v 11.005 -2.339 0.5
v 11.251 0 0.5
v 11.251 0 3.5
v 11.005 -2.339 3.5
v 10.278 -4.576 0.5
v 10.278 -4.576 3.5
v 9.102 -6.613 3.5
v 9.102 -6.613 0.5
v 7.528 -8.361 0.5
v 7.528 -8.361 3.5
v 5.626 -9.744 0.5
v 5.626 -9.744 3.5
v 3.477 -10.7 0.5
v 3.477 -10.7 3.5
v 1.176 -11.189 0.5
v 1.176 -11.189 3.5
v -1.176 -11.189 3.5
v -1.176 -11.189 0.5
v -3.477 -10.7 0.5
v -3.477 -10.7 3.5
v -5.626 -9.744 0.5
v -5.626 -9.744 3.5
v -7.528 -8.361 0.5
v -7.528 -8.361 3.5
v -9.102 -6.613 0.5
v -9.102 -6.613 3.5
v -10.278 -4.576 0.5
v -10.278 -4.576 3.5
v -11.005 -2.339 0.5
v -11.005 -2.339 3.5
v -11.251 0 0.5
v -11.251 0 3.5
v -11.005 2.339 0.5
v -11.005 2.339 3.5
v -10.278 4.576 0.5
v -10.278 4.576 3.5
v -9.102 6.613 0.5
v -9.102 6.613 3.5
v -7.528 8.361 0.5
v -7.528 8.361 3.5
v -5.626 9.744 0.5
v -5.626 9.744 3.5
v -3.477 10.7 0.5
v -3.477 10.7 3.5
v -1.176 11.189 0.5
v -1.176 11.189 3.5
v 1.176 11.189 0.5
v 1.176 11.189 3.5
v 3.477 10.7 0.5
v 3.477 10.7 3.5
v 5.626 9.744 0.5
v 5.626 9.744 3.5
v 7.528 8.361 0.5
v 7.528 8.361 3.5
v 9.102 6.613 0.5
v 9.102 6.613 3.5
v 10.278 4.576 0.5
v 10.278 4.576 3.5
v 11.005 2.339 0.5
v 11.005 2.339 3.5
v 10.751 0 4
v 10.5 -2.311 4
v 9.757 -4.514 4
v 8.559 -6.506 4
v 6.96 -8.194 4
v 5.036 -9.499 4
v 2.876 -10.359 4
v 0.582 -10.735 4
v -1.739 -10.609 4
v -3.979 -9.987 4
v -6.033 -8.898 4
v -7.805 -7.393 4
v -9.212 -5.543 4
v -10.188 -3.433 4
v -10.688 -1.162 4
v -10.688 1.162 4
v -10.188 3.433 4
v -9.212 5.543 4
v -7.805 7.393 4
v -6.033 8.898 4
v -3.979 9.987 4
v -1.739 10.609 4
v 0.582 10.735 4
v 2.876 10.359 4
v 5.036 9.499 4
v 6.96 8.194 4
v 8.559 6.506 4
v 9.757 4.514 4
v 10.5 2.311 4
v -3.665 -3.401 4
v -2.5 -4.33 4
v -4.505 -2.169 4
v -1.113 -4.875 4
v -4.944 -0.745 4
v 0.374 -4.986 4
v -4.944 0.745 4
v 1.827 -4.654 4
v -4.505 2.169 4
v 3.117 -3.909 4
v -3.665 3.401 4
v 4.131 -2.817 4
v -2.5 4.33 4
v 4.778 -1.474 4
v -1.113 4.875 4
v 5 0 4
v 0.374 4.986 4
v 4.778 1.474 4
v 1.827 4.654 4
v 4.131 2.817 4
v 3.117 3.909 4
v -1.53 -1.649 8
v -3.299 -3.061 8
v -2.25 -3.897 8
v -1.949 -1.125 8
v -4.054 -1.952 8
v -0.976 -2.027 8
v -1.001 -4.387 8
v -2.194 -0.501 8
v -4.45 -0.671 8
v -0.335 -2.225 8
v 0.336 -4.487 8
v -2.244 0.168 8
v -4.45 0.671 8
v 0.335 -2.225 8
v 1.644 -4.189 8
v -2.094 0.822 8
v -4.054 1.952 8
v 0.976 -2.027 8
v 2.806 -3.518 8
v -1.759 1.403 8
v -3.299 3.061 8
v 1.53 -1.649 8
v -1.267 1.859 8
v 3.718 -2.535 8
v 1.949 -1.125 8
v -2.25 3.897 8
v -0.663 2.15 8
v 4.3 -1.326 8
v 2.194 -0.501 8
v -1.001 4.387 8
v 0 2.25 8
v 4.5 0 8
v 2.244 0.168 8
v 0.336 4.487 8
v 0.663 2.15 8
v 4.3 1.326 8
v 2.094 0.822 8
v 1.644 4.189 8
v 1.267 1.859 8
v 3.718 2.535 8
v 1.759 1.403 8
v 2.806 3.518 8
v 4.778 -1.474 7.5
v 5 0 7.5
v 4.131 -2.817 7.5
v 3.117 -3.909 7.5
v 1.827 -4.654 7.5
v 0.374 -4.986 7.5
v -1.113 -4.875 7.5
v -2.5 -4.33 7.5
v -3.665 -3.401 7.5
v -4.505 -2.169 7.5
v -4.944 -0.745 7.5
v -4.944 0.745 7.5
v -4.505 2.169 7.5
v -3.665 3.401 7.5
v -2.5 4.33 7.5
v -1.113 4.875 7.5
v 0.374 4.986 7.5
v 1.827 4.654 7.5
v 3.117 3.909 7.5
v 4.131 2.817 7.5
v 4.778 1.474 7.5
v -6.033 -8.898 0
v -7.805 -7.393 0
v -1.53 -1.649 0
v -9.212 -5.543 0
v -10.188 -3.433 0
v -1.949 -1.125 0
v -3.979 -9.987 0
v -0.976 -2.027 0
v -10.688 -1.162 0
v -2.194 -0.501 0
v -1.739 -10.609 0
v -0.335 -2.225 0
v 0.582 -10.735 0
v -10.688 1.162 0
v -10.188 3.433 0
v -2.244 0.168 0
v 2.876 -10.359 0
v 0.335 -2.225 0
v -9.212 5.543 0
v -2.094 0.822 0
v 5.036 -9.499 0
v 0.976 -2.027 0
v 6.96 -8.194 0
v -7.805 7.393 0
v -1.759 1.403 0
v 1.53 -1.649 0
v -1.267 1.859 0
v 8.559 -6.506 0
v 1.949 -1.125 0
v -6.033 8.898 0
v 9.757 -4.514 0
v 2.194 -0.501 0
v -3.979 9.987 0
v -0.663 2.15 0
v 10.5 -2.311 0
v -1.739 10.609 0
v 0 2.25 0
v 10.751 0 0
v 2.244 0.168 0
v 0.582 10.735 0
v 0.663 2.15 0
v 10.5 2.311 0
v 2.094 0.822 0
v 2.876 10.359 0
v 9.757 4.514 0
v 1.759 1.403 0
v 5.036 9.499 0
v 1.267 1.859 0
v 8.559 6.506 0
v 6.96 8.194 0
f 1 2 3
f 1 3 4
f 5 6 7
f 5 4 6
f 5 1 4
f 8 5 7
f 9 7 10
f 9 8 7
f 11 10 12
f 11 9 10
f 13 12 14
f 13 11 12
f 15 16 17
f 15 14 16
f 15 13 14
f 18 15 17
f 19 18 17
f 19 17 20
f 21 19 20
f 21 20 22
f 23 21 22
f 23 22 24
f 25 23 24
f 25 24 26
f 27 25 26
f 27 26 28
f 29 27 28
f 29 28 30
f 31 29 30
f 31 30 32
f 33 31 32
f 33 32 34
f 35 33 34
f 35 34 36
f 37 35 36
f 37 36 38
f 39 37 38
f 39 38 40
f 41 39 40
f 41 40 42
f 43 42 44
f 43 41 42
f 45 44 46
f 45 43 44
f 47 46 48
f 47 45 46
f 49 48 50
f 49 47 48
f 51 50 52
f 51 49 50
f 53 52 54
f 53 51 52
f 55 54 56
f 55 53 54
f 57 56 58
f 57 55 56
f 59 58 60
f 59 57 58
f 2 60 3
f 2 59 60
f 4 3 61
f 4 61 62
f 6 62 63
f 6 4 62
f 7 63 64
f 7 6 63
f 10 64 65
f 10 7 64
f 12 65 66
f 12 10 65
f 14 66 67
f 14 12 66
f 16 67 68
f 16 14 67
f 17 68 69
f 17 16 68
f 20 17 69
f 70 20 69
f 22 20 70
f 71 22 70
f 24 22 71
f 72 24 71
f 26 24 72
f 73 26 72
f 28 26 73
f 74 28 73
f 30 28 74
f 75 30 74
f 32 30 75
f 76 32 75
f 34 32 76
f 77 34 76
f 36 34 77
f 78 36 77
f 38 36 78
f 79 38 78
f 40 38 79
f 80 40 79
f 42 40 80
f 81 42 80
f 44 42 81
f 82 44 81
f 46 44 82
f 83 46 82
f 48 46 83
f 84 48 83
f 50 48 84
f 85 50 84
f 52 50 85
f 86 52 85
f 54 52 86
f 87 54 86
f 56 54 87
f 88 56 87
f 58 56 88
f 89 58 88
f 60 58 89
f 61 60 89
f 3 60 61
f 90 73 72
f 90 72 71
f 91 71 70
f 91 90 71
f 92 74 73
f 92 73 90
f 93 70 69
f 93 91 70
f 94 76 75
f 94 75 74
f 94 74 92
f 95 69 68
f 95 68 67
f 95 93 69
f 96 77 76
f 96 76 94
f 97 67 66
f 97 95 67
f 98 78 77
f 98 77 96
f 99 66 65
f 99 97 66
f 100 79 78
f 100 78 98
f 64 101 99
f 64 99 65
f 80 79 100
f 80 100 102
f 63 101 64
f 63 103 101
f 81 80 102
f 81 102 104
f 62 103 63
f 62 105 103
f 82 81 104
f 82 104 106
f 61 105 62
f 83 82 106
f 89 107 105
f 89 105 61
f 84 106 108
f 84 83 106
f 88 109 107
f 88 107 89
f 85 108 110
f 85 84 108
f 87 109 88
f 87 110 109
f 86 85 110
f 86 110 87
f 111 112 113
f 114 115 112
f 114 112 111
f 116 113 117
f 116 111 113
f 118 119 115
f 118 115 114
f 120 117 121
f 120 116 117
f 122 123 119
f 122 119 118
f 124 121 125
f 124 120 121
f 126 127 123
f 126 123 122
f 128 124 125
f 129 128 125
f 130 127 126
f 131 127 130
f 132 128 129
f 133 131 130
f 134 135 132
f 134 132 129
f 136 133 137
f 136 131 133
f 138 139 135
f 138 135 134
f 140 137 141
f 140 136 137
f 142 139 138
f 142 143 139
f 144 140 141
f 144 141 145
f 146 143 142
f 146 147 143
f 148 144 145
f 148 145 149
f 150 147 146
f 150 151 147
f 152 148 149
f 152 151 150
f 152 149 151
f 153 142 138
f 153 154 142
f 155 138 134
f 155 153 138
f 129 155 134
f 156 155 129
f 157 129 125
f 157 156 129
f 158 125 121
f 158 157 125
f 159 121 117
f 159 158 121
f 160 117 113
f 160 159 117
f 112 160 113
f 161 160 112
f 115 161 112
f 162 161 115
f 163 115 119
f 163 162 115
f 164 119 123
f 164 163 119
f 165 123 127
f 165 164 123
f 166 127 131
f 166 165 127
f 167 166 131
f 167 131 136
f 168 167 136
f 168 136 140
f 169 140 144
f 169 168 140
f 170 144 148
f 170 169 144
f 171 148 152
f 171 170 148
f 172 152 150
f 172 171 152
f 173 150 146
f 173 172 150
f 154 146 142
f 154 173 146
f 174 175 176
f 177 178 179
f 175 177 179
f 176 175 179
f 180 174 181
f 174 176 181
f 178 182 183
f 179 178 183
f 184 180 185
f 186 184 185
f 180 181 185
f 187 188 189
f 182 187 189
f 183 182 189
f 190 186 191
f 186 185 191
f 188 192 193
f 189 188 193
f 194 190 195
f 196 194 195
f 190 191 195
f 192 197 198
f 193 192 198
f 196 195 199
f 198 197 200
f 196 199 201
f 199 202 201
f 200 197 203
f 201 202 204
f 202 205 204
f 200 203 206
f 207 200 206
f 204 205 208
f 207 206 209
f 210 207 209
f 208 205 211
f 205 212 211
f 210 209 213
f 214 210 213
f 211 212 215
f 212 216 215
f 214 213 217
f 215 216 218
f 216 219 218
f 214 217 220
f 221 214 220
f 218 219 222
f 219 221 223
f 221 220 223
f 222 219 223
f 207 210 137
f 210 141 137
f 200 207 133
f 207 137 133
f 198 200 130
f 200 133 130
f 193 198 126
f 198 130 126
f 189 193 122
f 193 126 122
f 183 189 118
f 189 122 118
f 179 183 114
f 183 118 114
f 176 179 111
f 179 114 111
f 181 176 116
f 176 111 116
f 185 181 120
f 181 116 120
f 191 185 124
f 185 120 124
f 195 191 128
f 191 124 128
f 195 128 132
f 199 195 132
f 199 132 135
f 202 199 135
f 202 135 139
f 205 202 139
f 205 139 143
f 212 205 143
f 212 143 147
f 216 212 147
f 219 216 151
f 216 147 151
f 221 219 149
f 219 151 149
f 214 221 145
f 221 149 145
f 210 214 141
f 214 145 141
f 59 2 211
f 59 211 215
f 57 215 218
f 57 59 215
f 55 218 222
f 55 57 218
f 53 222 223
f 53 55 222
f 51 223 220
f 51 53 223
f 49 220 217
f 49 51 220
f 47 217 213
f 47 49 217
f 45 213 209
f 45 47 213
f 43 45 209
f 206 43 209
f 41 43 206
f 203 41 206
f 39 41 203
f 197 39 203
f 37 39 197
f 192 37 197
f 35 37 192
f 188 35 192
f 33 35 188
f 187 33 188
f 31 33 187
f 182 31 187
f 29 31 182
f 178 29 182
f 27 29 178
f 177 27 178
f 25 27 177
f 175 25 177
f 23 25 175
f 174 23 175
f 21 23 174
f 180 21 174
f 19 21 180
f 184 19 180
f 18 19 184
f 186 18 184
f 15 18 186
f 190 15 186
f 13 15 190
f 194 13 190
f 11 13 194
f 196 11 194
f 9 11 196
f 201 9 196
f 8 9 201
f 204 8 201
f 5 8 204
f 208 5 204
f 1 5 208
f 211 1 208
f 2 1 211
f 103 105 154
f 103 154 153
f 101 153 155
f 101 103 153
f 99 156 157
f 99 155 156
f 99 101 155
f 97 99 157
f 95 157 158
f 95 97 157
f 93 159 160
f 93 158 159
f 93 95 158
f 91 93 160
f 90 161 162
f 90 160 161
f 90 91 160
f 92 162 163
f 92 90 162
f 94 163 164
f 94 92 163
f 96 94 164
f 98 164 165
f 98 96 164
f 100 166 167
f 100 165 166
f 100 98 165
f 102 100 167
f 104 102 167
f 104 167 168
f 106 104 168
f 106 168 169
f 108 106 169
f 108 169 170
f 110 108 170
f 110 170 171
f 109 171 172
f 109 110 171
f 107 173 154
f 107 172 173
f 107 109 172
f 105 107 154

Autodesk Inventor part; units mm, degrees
ref_plane "YZ Plane" through (0, 0, 0) normal (1, 0, 0) x (0, 1, 0)
ref_plane "XZ Plane" through (0, 0, 0) normal (0, 1, 0) x (-1, 0, 0)
ref_plane "XY Plane" through (0, 0, 0) normal (0, 0, 1) x (1, 0, 0)
sketch "Sketch5" plane through (0, 0, 0) normal (0, 0, 1) x (1, 0, 0)
  circle A0 centre (0, 0) radius 11.251
  dimension "d8" = 22.502
extrude "Extrusion5" add sketch "Sketch5" along normal blind 4
sketch "Sketch6" plane through (0, 0, 4) normal (0, 0, 1) x (1, 0, 0)
  circle A0 centre (0, 0) radius 11.251 projected
  circle A1 centre (0, 0) radius 5
  dimension "d15" = 10
extrude "Extrusion6" add sketch "Sketch6" along normal blind 4 contours A1
hole "Hole1" at (0, 0, 0) direction (0, 0, 1) diameter 4.5 end through all
chamfer "Chamfer2" distance 0.5 angle 45 3 edges at (-11.251, 0, 0) (-11.251, 0, 4) (-5, 0, 8)
properties part number "BC-10011" material "Aço Inox AISI 304"
